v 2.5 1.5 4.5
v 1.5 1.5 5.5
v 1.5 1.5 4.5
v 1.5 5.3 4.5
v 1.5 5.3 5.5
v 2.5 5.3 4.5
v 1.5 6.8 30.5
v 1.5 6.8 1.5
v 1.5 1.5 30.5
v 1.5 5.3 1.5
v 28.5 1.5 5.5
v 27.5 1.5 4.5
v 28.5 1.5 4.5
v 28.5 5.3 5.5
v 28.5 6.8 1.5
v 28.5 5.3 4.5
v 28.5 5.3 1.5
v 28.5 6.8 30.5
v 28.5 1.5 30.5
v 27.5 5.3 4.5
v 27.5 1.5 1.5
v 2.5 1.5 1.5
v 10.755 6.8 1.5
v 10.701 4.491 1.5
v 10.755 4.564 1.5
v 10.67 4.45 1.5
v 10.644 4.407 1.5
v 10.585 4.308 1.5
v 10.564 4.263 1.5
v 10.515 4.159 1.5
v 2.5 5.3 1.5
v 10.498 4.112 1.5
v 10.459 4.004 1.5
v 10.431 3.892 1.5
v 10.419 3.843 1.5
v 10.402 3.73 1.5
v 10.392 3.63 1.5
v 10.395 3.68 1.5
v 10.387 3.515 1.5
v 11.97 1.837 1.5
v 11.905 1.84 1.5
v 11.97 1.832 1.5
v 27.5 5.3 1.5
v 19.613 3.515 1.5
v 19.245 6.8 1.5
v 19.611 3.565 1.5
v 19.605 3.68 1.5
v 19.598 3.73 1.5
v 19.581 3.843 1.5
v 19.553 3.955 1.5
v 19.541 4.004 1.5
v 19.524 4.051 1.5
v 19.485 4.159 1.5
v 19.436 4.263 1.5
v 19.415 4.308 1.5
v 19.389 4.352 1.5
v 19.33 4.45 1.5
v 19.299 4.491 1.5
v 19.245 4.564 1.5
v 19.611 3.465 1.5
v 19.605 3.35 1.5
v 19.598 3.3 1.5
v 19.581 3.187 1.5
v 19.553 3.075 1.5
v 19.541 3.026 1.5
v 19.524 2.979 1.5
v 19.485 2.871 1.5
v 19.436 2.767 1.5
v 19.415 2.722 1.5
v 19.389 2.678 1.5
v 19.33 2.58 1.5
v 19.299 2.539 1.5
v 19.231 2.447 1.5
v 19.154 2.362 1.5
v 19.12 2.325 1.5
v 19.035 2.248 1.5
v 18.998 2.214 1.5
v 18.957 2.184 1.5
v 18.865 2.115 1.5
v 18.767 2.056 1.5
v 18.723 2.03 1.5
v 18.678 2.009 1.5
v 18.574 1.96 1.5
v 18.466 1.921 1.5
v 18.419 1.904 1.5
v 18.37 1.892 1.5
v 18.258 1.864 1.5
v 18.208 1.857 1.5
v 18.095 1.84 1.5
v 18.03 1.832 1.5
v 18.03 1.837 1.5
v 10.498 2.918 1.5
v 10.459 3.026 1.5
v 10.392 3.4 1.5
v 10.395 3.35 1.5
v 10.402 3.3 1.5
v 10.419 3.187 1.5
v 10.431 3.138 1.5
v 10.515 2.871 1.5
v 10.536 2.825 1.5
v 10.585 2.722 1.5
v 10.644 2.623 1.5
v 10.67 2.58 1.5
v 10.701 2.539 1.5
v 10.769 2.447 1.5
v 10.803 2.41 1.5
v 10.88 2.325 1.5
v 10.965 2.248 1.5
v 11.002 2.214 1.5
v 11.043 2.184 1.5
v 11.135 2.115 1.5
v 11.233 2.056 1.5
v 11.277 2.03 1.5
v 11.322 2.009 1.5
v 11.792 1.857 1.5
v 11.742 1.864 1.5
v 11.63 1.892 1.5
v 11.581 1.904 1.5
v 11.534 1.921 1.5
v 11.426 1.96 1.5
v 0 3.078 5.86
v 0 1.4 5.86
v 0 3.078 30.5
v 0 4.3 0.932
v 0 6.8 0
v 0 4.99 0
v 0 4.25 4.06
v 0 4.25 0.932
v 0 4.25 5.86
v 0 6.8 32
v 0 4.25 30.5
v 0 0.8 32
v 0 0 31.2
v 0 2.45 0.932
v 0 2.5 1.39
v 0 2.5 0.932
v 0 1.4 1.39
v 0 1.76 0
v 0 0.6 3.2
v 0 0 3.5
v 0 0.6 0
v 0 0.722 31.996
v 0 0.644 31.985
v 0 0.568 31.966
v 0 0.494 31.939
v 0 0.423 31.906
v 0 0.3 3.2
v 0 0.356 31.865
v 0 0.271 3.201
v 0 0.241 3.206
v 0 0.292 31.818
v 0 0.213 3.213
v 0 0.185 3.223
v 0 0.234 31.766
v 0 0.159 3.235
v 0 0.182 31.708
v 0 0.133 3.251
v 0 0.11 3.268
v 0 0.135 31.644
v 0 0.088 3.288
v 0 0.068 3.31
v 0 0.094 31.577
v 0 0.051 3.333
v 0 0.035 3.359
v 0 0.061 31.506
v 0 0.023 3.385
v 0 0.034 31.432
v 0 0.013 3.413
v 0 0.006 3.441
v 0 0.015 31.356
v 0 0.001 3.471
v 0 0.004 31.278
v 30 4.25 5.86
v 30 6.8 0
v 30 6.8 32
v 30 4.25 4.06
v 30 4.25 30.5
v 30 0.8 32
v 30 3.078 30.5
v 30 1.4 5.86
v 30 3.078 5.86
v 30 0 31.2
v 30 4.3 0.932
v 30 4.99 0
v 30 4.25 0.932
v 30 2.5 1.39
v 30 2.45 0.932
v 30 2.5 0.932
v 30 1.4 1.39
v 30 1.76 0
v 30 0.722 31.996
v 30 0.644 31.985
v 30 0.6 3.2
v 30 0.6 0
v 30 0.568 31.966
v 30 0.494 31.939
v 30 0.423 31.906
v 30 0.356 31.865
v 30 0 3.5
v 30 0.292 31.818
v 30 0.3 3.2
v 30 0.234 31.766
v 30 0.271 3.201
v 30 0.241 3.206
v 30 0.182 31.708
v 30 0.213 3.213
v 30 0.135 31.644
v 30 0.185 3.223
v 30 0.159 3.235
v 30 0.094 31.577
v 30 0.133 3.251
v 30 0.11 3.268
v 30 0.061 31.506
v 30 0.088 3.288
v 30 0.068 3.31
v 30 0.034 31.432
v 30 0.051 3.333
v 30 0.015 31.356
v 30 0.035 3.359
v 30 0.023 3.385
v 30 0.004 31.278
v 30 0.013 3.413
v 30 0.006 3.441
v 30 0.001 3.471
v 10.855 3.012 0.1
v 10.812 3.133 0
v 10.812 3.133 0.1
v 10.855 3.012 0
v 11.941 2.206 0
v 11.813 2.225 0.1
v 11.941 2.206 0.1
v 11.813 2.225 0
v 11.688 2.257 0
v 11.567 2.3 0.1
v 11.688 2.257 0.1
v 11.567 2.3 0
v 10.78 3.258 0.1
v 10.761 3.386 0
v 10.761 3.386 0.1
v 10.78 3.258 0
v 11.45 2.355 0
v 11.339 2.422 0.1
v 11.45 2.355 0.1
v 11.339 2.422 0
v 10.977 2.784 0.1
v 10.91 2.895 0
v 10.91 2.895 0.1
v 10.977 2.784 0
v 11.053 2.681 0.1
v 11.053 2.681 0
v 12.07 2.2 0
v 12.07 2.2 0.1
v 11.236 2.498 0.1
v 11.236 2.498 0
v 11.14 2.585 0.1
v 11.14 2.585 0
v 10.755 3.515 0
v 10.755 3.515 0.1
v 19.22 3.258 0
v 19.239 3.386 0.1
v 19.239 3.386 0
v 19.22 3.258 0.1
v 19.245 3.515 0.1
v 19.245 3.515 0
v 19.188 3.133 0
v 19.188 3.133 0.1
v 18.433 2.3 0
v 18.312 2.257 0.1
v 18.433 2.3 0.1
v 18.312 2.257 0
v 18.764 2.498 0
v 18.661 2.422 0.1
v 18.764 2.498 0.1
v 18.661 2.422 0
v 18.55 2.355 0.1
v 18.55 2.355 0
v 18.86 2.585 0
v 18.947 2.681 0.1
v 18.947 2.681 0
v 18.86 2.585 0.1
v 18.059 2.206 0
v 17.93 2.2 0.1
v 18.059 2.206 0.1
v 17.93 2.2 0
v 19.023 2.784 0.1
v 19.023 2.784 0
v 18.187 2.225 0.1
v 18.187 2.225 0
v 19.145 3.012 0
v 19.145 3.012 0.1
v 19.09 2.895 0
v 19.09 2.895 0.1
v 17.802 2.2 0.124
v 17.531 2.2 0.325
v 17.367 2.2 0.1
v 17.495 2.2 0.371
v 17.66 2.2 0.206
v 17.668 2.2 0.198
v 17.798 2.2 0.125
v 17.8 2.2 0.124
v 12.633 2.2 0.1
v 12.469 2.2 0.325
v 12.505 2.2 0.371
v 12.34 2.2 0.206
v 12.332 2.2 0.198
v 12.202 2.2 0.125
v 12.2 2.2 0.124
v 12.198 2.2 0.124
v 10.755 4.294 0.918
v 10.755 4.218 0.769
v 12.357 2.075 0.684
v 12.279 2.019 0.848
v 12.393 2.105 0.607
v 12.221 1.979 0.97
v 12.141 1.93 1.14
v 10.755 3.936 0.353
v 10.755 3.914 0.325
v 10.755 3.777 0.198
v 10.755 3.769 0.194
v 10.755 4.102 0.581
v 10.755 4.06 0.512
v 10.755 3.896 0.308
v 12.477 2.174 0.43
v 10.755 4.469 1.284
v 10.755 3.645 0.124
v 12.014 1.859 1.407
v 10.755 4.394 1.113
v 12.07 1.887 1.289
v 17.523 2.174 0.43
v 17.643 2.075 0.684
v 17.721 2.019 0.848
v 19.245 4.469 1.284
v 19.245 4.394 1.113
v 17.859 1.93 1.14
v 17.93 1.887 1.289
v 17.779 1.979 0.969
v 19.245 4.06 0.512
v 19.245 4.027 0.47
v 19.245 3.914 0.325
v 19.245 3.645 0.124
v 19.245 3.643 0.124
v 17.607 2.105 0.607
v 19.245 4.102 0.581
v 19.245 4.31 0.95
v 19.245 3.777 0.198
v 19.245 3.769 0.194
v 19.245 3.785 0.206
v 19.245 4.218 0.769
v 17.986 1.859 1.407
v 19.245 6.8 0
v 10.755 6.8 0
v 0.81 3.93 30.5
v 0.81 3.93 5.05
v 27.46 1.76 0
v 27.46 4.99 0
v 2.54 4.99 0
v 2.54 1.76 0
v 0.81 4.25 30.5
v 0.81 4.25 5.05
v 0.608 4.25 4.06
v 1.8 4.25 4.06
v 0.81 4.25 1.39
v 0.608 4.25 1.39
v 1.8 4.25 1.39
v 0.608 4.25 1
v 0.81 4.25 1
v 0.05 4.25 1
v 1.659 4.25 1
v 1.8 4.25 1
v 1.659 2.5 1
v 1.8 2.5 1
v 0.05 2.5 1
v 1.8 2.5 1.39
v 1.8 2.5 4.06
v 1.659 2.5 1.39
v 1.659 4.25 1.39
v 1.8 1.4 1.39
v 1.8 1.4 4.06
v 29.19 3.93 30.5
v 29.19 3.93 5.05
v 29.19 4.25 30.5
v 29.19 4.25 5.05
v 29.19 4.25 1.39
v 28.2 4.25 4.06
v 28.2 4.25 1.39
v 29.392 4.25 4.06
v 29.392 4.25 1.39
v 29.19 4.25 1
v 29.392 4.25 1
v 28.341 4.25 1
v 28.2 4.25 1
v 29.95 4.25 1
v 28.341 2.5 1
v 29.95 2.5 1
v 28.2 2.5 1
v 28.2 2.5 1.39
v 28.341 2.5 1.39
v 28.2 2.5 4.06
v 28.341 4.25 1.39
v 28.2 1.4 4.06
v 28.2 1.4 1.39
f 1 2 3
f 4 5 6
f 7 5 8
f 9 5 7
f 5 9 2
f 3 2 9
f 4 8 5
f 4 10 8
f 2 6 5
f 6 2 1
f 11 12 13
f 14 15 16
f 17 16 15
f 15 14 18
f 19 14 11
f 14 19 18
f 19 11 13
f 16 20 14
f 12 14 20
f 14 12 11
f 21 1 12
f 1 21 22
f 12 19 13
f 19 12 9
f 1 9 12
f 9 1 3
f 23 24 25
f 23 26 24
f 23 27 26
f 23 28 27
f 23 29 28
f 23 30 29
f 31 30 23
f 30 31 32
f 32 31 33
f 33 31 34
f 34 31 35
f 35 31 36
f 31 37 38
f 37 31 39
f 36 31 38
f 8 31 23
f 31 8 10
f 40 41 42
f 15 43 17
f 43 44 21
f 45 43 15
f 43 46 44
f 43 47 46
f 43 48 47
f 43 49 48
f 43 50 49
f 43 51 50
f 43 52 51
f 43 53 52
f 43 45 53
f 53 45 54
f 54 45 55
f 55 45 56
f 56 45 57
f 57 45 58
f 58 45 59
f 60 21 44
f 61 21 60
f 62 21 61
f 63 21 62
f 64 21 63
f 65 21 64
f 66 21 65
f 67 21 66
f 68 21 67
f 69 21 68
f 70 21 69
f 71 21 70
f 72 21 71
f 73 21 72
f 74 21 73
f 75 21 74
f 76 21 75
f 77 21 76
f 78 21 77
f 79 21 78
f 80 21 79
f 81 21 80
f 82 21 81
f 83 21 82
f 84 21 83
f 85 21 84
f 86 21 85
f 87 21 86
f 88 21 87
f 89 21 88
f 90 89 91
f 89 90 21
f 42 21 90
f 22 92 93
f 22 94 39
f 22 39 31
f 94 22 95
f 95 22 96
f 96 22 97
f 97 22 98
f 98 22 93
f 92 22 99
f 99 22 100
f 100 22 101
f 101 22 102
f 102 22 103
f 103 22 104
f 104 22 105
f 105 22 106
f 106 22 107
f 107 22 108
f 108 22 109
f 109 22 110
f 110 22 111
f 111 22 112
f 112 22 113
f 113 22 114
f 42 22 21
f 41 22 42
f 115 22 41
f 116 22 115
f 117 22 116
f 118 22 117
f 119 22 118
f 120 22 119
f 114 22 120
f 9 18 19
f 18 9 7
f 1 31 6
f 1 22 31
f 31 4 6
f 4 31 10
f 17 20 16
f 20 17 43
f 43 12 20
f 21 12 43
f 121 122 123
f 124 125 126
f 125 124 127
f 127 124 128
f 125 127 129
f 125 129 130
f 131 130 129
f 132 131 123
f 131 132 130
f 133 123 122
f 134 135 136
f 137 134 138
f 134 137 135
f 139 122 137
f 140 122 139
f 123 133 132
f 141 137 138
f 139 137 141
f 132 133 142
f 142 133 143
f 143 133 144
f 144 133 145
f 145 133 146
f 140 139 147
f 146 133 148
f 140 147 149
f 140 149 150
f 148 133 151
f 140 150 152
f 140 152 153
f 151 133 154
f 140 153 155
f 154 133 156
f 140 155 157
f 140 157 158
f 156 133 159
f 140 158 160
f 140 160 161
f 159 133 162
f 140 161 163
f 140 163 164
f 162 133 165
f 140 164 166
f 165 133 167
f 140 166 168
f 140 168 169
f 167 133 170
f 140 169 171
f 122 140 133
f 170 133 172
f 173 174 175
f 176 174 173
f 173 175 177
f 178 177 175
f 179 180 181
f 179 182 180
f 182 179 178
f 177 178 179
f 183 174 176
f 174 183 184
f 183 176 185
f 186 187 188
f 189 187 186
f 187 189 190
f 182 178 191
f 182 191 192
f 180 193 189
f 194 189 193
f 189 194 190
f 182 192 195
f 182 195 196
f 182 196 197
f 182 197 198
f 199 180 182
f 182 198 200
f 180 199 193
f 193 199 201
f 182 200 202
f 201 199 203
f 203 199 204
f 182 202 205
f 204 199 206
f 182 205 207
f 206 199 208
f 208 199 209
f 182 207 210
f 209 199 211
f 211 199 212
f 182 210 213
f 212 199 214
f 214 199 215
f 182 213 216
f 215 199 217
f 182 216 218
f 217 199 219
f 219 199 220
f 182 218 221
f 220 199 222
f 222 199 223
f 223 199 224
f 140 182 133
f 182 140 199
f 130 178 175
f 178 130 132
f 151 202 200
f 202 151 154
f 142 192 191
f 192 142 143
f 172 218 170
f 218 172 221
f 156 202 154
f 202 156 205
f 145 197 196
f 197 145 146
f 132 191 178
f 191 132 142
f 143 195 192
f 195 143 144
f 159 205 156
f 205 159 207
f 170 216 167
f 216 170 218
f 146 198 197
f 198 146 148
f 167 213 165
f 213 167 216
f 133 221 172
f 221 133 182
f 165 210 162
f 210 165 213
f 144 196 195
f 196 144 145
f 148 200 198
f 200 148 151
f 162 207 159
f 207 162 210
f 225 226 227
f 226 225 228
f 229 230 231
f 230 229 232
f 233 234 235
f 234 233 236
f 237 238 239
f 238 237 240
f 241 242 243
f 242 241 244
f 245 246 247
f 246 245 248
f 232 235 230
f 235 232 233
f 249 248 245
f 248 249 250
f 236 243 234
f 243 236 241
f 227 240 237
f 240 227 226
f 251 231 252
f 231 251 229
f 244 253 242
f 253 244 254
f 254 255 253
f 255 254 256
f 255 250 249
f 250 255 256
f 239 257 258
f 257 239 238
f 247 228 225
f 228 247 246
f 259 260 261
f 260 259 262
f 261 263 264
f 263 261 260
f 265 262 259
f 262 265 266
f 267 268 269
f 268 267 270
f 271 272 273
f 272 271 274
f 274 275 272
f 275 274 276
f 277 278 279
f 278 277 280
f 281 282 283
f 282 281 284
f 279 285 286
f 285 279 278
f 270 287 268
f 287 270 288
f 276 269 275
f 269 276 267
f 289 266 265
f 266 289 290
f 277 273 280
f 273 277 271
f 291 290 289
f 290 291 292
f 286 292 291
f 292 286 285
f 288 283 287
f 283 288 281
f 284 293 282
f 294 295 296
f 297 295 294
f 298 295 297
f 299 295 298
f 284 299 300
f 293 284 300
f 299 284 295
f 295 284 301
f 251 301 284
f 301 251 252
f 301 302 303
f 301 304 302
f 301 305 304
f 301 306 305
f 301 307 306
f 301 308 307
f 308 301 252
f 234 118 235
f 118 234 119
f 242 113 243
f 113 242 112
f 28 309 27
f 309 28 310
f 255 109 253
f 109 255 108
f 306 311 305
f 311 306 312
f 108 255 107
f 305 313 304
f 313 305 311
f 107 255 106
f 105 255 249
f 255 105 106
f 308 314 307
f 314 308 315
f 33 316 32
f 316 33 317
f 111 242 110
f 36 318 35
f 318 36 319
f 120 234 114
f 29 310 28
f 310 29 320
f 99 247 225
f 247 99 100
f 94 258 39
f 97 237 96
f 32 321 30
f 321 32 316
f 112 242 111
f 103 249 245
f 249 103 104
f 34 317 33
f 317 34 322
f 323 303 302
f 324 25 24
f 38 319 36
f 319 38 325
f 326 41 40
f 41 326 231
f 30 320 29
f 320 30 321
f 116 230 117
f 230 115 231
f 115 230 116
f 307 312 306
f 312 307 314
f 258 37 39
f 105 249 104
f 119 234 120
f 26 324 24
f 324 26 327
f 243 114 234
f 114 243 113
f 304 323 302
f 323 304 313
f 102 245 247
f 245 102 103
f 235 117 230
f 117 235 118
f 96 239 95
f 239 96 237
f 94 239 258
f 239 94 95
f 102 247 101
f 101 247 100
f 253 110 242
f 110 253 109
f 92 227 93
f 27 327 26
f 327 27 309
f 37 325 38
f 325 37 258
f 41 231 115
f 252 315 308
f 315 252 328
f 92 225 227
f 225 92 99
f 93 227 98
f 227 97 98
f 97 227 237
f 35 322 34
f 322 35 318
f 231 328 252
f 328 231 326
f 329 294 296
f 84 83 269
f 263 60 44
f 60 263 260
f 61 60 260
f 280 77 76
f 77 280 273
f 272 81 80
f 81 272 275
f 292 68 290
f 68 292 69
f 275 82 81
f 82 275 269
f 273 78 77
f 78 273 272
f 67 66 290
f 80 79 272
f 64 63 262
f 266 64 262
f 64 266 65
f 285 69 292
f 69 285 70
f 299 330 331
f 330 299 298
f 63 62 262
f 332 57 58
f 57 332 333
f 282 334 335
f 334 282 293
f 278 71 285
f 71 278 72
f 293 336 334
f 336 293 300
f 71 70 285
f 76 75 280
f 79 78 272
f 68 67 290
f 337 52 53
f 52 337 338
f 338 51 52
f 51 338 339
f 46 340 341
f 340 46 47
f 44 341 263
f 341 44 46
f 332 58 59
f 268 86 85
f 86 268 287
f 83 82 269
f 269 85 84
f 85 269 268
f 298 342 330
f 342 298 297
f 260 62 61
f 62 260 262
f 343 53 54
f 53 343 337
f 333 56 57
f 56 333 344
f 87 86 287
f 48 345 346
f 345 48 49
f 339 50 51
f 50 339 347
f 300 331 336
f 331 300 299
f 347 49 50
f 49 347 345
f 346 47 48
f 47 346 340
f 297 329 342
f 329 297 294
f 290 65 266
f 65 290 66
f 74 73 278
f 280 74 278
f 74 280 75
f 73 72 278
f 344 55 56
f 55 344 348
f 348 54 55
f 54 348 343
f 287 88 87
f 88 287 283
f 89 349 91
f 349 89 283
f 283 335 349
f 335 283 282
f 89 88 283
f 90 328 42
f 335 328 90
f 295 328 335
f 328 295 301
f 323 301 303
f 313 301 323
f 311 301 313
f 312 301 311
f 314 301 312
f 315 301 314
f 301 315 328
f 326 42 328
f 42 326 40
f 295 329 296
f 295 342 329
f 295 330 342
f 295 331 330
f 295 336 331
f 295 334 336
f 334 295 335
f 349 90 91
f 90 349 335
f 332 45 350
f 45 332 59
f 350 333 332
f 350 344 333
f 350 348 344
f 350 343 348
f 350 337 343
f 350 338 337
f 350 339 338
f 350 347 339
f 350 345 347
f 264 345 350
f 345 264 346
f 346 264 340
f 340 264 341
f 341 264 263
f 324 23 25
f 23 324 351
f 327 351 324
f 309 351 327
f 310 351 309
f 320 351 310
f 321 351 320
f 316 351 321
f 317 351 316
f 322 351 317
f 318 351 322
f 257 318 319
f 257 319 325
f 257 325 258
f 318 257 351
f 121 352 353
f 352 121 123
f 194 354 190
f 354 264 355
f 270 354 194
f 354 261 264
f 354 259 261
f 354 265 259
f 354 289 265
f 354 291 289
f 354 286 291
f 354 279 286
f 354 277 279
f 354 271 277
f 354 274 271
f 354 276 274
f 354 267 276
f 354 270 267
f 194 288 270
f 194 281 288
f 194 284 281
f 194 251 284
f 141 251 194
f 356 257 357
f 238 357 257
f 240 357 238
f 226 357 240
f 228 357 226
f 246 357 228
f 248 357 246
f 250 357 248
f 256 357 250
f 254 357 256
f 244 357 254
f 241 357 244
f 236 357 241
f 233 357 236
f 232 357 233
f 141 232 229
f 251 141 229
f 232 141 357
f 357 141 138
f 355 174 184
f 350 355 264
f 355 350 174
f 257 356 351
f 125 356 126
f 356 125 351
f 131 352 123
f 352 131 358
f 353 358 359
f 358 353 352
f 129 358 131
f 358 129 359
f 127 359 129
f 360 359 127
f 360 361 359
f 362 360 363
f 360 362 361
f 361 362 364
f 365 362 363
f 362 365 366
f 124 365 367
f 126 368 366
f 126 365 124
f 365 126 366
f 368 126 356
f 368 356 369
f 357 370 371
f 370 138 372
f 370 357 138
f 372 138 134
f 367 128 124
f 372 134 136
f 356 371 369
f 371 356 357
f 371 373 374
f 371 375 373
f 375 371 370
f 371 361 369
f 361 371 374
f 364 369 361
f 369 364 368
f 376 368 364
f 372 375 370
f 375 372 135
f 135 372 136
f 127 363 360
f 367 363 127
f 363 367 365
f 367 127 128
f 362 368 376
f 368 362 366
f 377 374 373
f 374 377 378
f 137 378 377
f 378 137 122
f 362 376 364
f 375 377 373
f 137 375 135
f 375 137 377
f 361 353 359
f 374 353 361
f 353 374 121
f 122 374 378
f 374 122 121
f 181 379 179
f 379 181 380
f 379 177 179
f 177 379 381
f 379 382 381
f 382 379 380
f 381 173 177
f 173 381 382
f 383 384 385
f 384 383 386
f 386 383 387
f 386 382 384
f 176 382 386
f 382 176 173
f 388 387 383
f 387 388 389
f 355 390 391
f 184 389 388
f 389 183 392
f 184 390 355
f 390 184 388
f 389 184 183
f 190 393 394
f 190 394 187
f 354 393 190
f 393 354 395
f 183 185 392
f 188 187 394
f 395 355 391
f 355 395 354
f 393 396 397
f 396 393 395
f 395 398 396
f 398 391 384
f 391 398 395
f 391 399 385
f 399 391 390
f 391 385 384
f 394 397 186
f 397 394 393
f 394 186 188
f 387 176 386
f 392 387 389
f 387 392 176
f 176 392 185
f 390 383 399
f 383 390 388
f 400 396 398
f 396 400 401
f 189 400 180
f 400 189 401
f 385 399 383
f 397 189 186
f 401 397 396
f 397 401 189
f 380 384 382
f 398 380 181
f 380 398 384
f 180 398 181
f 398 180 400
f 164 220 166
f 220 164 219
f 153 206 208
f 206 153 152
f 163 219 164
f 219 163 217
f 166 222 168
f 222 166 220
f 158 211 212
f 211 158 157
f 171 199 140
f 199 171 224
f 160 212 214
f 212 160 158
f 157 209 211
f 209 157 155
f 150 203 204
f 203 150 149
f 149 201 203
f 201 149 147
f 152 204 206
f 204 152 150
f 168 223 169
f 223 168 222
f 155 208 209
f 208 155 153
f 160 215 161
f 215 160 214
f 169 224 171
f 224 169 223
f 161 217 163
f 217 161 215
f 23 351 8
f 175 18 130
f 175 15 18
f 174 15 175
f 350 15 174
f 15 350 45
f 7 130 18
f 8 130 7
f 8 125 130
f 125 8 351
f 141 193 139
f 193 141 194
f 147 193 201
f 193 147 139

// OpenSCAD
// Parametric Expansion Card
//  An OpenSCAD implementation of a basic enclosure of an Expansion Card for
//  use with Framework products like the Framework Laptop.
//
//  See https://frame.work for more information about Framework products and
//  additional documentation around Expansion Cards.

// Parametric Expansion Card © 2021 by Nirav Patel at Framework Computer LLC
// is licensed under Attribution 4.0 International. 
// To view a copy of this license, visit http://creativecommons.org/licenses/by/4.0/

// The basic dimensions of an Expansion Card
base = [30.0, 32.0, 6.8];
// The default wall thickness
side_wall = 1.5;

// Size and location of the typical PCB
pcb_gap = 0.5;
pcb = [26.0, 30.0, 0.8];
pcb_h = 3.05;

// USB-C plug dimensions
usb_c_r = 1.315;
usb_c_w = 5.86+usb_c_r*2;
usb_c_h = 2.2;

rail_h = 4.25; // to top of rail

// Boss locations matching the other Framework Expansion Cards
boss_y = 10.5;
boss_x = 3.7;

// The rail cutout in the sides of the card
module rail(make_printable) {
    rail_depth = 0.81;
    rail_flat_h = 0.32;
    
    mirror([0, 1, 0]) {
        
        // The rail that holds the card
        bottom_angle = 43.54;
        difference() {
            union() {
                translate([rail_depth, 0, -rail_flat_h]) rotate([0, 180+bottom_angle, 0]) cube([2, base[1]-side_wall, 2]);
                translate([-2+rail_depth, 0, -rail_flat_h]) cube([2, base[1]-side_wall, rail_flat_h]);
            }
            translate([-5+rail_depth, 0, 0]) cube([5, base[1]-side_wall, 5]);
        }
    
        pyramid_b = 3.23*sqrt(2);
        pyramid_t = 1.75*sqrt(2);
        pyramid_h = 1.0;
        pyramid_inset = 1.3+0.5;
        pyramid_step = 3.06;
        
        // The ramps to make slotting into the latch smooth
        translate([-1.75/2+pyramid_inset, 0, -1.75/2]) rotate([-90, 0, 0]) rotate([0, 0, 45]) { 
            cylinder(r1 = pyramid_b/2, r2 = pyramid_t/2, h = pyramid_h, $fn=4);
            cylinder(r = pyramid_t/2, h = pyramid_step+pyramid_h, $fn=4);
            translate([-0.1, 0.1, 0])cylinder(r = pyramid_t/2, h = pyramid_step+pyramid_h, $fn=4);
        }
        
        latch_l = 2.67;
        latch_d = pyramid_inset;
        latch_h = 2.85;
        latch_wall = 1.39;
        
        // The pocket that the latch bar drops into, including a 45 degree cut for printability
        translate([0, latch_wall, -latch_h]) cube([latch_d, latch_l, latch_h]);
        if (make_printable) {
            translate([latch_d, latch_wall+latch_l, -latch_h]) rotate([0, 0, -180+45]) translate([0, -latch_l, 0]) cube([latch_d*2, latch_l, latch_h]);
        }
    }
}

// A simple 45 degree rib to improve printability
module rib(thickness, height) {
    translate([-thickness/2, 0, 0]) difference() {
        cube([thickness, height, height]);
        translate([-thickness/2, height, 0]) rotate([45, 0, 0]) cube([thickness*2, height*2, height*2]);
    }
}

// A simple cylinder cutout to fillet edges
module fillet(radius, length) {
    translate([length, 0, 0]) rotate([0, -90, 0]) difference() {
        cube([radius, radius, length]);
        translate([radius, radius, -1]) cylinder(h = length+2, r = radius, $fn = 64);
    }
}

// The cutout for the USB-C plug
module usb_c_cutout(open_top) {
    // The plug is "pushed in" by an extra 0.6 to account for 3d printing tolerances
    translate([-usb_c_w/2+usb_c_r, 7-10+0.6, usb_c_r]) rotate([-90, 0, 0]) union() {
        translate([0, usb_c_r, 0]) cylinder(r = usb_c_r, h = 10, $fn = 64);
        translate([usb_c_w-usb_c_r*2, usb_c_r, 0]) cylinder(r = usb_c_r, h = 10, $fn = 64);
        cube([usb_c_w-usb_c_r*2, usb_c_r*2, 10]);
        
        // Cutout for the pin side of the shell that expands out
        translate([0, usb_c_r, 0]) cylinder(r2 = usb_c_r, r1 = 3.84/2, h = 10-7.7, $fn = 64);
        translate([usb_c_w-usb_c_r*2, usb_c_r, 0]) cylinder(r2 = usb_c_r, r1 = 3.84/2, h = 10-7.7, $fn = 64);
        translate([usb_c_w/2-usb_c_r, usb_c_r, 0]) scale([1.8, 1, 1]) rotate([0, 0, 45]) cylinder(r2 = usb_c_r*sqrt(2), r1 = 3.84/2*sqrt(2), h = 10-7.7, $fn = 4);
        
        // If the card drops in from the top rather than sliding in from the front,
        // cut out a slot for the USB-C plug to drop into.
        if (open_top) {
            translate([-usb_c_r, -10+usb_c_r, 0]) cube([usb_c_w, 10, 10]);
        }
    }
}

// Quarter section of a sphere, used as a clip
module qsphere(radius = 1) {
    difference() {
        sphere(r = radius, $fn = 32);
        translate([-radius-1, -radius-1, -radius]) cube([radius*2+2, radius*2+2, radius]);
        translate([0, -radius-1, -radius-1]) cube([radius, radius*2+2, radius*2+2]);
    }
}

// The screw boss for the PCB, optionally with space for a threaded insert
module boss(radius, use_insert, make_printable) {
    difference() {
        cylinder(r = radius, h = pcb_h, $fn = 64);
        if (use_insert) {
            // Use threaded insert
            translate([0, 0, side_wall]) cylinder(r = 1.5, h = pcb_h, $fn = 64);
        } else {
            translate([0, 0, side_wall]) cylinder(r = 0.75, h = pcb_h, $fn = 64);
        }
    }
    
    // Add a rib for printability
    if (make_printable) {
        translate([0, radius-0.1, 0]) rib(1, pcb_h);
    }
}

// Incomplete implementation of a lid to use with this shell
module expansion_card_lid() {
    gap = 0.25;
    union() {
        translate([side_wall+gap, side_wall+gap, base[2]-side_wall]) cube([base[0]-side_wall*2-gap*2, base[1]-side_wall*2-gap*2, side_wall]);
        difference() {
            translate([base[0]/2-usb_c_w/2+gap, base[1]-side_wall-gap, usb_c_r+usb_c_h]) cube([usb_c_w-gap*2, side_wall+gap, base[2]-(usb_c_r+usb_c_h)]);
            translate([base[0]/2, base[1], usb_c_r+usb_c_h]) usb_c_cutout(false);
        }
    }
}

// A basic, printable Expansion Card enclosure
//  open_end - A boolean to make the end of the card that is exposed when inserted open
//  make_printable - Adds ribs to improve printability
//  pcb_mount - The method the PCB is held in with, "boss" for self-threading screws,
//            "boss_insert" for fastener with a threaded insert,
//            "clip" for a fastener-less clip, or
//            "" for no PCB mounting structure
module expansion_card_base(open_end, make_printable, pcb_mount="boss") {
    // Hollowing of the inside
    extra = 0.1;
    inner = [base[0]-side_wall*2, base[1]-side_wall*2, base[2]-side_wall+extra];
    boss_radius = 2.3;
    
    difference() {
        cube(base);
        
        difference() {
            notch = 1.0;
            notch_l = 3.0;
            notch_h = 3.8;
            // The main hollow
            translate([side_wall, open_end ? 0 : side_wall, side_wall]) cube([inner[0], open_end ? inner[1]+side_wall : inner[1], inner[2]]);
            // Extra wall thickness where the latch cutouts are
            translate([side_wall, inner[1]+side_wall-notch_l, side_wall+notch_h/2]) rotate([0, 0, -90]) rotate([0, 90, 0]) rib(notch_h, notch);
            translate([side_wall, inner[1]+side_wall-notch_l, side_wall]) cube([notch, notch_l, notch_h]);
            translate([inner[0]+side_wall, inner[1]+side_wall-notch_l, side_wall+notch_h/2]) rotate([0, 0, 180]) rotate([0, 90, 0]) rib(notch_h, notch);
            translate([inner[0]+side_wall-notch, inner[1]+side_wall-notch_l, side_wall]) cube([notch, notch_l, notch_h]);
        }
        
        // The rounded front edge to match the laptop
        edge_r = 0.8;
        fillet(edge_r, base[0]);
        
        // The USB-C plug cutout
        translate([base[0]/2, base[1], usb_c_r+usb_c_h]) usb_c_cutout(!open_end);
        
        // The sliding rails
        translate([0, base[1], rail_h]) rail(make_printable);
        translate([base[0], base[1], rail_h]) mirror([1, 0, 0]) rail(make_printable);
        
        // Cut out the end of what is normally the aluminum cover
        ledge_cut = 0.6;
        ledge_cut_d = 3.2;
        ledge_fillet_r = 0.3;
        
        translate([0, base[1]-ledge_cut_d, 0]) cube([base[0], ledge_cut_d, ledge_cut]);
        // The fillet on that cover
        translate([base[0], base[1]-ledge_cut_d, 0]) rotate([0, 0, 180]) fillet(ledge_cut/2, base[0]);
    }
    
    if (pcb_mount == "boss" || pcb_mount == "boss_insert") {        
        // Add the screw bosses
        translate([boss_x, boss_y, 0]) boss(boss_radius, pcb_mount == "boss_insert", make_printable);
        translate([base[0]-boss_x, boss_y, 0]) boss(boss_radius, pcb_mount == "boss_insert", make_printable);
    } else if (pcb_mount == "clip") {
        clip_w = 1.5;
        clip_gap = 0.5;
        translate([boss_x-boss_radius, boss_y-boss_radius, 0]) {
            cube([boss_radius*2, boss_radius*2, pcb_h]);
            if (make_printable)
                translate([boss_radius, boss_radius*2, 0]) rib(boss_radius*2, pcb_h);
            translate([0, boss_radius-clip_w, pcb_h+pcb[2]+clip_gap]) rotate([0, 0, 180]) qsphere(clip_w);
        }
        translate([base[0]-boss_x-boss_radius, boss_y-boss_radius, 0]) {
            cube([boss_radius*2, boss_radius*2, pcb_h]);
            if (make_printable)
                translate([boss_radius, boss_radius*2, 0]) rib(boss_radius*2, pcb_h);
            translate([boss_radius*2, boss_radius-clip_w, pcb_h+pcb[2]+clip_gap]) qsphere(clip_w);
        }
    }
}

// Rotate into a printable orientation
rotate([-90, 0, 0]) translate([0, -base[1], 0]) expansion_card_base(open_end = false, make_printable = true, pcb_mount="");
